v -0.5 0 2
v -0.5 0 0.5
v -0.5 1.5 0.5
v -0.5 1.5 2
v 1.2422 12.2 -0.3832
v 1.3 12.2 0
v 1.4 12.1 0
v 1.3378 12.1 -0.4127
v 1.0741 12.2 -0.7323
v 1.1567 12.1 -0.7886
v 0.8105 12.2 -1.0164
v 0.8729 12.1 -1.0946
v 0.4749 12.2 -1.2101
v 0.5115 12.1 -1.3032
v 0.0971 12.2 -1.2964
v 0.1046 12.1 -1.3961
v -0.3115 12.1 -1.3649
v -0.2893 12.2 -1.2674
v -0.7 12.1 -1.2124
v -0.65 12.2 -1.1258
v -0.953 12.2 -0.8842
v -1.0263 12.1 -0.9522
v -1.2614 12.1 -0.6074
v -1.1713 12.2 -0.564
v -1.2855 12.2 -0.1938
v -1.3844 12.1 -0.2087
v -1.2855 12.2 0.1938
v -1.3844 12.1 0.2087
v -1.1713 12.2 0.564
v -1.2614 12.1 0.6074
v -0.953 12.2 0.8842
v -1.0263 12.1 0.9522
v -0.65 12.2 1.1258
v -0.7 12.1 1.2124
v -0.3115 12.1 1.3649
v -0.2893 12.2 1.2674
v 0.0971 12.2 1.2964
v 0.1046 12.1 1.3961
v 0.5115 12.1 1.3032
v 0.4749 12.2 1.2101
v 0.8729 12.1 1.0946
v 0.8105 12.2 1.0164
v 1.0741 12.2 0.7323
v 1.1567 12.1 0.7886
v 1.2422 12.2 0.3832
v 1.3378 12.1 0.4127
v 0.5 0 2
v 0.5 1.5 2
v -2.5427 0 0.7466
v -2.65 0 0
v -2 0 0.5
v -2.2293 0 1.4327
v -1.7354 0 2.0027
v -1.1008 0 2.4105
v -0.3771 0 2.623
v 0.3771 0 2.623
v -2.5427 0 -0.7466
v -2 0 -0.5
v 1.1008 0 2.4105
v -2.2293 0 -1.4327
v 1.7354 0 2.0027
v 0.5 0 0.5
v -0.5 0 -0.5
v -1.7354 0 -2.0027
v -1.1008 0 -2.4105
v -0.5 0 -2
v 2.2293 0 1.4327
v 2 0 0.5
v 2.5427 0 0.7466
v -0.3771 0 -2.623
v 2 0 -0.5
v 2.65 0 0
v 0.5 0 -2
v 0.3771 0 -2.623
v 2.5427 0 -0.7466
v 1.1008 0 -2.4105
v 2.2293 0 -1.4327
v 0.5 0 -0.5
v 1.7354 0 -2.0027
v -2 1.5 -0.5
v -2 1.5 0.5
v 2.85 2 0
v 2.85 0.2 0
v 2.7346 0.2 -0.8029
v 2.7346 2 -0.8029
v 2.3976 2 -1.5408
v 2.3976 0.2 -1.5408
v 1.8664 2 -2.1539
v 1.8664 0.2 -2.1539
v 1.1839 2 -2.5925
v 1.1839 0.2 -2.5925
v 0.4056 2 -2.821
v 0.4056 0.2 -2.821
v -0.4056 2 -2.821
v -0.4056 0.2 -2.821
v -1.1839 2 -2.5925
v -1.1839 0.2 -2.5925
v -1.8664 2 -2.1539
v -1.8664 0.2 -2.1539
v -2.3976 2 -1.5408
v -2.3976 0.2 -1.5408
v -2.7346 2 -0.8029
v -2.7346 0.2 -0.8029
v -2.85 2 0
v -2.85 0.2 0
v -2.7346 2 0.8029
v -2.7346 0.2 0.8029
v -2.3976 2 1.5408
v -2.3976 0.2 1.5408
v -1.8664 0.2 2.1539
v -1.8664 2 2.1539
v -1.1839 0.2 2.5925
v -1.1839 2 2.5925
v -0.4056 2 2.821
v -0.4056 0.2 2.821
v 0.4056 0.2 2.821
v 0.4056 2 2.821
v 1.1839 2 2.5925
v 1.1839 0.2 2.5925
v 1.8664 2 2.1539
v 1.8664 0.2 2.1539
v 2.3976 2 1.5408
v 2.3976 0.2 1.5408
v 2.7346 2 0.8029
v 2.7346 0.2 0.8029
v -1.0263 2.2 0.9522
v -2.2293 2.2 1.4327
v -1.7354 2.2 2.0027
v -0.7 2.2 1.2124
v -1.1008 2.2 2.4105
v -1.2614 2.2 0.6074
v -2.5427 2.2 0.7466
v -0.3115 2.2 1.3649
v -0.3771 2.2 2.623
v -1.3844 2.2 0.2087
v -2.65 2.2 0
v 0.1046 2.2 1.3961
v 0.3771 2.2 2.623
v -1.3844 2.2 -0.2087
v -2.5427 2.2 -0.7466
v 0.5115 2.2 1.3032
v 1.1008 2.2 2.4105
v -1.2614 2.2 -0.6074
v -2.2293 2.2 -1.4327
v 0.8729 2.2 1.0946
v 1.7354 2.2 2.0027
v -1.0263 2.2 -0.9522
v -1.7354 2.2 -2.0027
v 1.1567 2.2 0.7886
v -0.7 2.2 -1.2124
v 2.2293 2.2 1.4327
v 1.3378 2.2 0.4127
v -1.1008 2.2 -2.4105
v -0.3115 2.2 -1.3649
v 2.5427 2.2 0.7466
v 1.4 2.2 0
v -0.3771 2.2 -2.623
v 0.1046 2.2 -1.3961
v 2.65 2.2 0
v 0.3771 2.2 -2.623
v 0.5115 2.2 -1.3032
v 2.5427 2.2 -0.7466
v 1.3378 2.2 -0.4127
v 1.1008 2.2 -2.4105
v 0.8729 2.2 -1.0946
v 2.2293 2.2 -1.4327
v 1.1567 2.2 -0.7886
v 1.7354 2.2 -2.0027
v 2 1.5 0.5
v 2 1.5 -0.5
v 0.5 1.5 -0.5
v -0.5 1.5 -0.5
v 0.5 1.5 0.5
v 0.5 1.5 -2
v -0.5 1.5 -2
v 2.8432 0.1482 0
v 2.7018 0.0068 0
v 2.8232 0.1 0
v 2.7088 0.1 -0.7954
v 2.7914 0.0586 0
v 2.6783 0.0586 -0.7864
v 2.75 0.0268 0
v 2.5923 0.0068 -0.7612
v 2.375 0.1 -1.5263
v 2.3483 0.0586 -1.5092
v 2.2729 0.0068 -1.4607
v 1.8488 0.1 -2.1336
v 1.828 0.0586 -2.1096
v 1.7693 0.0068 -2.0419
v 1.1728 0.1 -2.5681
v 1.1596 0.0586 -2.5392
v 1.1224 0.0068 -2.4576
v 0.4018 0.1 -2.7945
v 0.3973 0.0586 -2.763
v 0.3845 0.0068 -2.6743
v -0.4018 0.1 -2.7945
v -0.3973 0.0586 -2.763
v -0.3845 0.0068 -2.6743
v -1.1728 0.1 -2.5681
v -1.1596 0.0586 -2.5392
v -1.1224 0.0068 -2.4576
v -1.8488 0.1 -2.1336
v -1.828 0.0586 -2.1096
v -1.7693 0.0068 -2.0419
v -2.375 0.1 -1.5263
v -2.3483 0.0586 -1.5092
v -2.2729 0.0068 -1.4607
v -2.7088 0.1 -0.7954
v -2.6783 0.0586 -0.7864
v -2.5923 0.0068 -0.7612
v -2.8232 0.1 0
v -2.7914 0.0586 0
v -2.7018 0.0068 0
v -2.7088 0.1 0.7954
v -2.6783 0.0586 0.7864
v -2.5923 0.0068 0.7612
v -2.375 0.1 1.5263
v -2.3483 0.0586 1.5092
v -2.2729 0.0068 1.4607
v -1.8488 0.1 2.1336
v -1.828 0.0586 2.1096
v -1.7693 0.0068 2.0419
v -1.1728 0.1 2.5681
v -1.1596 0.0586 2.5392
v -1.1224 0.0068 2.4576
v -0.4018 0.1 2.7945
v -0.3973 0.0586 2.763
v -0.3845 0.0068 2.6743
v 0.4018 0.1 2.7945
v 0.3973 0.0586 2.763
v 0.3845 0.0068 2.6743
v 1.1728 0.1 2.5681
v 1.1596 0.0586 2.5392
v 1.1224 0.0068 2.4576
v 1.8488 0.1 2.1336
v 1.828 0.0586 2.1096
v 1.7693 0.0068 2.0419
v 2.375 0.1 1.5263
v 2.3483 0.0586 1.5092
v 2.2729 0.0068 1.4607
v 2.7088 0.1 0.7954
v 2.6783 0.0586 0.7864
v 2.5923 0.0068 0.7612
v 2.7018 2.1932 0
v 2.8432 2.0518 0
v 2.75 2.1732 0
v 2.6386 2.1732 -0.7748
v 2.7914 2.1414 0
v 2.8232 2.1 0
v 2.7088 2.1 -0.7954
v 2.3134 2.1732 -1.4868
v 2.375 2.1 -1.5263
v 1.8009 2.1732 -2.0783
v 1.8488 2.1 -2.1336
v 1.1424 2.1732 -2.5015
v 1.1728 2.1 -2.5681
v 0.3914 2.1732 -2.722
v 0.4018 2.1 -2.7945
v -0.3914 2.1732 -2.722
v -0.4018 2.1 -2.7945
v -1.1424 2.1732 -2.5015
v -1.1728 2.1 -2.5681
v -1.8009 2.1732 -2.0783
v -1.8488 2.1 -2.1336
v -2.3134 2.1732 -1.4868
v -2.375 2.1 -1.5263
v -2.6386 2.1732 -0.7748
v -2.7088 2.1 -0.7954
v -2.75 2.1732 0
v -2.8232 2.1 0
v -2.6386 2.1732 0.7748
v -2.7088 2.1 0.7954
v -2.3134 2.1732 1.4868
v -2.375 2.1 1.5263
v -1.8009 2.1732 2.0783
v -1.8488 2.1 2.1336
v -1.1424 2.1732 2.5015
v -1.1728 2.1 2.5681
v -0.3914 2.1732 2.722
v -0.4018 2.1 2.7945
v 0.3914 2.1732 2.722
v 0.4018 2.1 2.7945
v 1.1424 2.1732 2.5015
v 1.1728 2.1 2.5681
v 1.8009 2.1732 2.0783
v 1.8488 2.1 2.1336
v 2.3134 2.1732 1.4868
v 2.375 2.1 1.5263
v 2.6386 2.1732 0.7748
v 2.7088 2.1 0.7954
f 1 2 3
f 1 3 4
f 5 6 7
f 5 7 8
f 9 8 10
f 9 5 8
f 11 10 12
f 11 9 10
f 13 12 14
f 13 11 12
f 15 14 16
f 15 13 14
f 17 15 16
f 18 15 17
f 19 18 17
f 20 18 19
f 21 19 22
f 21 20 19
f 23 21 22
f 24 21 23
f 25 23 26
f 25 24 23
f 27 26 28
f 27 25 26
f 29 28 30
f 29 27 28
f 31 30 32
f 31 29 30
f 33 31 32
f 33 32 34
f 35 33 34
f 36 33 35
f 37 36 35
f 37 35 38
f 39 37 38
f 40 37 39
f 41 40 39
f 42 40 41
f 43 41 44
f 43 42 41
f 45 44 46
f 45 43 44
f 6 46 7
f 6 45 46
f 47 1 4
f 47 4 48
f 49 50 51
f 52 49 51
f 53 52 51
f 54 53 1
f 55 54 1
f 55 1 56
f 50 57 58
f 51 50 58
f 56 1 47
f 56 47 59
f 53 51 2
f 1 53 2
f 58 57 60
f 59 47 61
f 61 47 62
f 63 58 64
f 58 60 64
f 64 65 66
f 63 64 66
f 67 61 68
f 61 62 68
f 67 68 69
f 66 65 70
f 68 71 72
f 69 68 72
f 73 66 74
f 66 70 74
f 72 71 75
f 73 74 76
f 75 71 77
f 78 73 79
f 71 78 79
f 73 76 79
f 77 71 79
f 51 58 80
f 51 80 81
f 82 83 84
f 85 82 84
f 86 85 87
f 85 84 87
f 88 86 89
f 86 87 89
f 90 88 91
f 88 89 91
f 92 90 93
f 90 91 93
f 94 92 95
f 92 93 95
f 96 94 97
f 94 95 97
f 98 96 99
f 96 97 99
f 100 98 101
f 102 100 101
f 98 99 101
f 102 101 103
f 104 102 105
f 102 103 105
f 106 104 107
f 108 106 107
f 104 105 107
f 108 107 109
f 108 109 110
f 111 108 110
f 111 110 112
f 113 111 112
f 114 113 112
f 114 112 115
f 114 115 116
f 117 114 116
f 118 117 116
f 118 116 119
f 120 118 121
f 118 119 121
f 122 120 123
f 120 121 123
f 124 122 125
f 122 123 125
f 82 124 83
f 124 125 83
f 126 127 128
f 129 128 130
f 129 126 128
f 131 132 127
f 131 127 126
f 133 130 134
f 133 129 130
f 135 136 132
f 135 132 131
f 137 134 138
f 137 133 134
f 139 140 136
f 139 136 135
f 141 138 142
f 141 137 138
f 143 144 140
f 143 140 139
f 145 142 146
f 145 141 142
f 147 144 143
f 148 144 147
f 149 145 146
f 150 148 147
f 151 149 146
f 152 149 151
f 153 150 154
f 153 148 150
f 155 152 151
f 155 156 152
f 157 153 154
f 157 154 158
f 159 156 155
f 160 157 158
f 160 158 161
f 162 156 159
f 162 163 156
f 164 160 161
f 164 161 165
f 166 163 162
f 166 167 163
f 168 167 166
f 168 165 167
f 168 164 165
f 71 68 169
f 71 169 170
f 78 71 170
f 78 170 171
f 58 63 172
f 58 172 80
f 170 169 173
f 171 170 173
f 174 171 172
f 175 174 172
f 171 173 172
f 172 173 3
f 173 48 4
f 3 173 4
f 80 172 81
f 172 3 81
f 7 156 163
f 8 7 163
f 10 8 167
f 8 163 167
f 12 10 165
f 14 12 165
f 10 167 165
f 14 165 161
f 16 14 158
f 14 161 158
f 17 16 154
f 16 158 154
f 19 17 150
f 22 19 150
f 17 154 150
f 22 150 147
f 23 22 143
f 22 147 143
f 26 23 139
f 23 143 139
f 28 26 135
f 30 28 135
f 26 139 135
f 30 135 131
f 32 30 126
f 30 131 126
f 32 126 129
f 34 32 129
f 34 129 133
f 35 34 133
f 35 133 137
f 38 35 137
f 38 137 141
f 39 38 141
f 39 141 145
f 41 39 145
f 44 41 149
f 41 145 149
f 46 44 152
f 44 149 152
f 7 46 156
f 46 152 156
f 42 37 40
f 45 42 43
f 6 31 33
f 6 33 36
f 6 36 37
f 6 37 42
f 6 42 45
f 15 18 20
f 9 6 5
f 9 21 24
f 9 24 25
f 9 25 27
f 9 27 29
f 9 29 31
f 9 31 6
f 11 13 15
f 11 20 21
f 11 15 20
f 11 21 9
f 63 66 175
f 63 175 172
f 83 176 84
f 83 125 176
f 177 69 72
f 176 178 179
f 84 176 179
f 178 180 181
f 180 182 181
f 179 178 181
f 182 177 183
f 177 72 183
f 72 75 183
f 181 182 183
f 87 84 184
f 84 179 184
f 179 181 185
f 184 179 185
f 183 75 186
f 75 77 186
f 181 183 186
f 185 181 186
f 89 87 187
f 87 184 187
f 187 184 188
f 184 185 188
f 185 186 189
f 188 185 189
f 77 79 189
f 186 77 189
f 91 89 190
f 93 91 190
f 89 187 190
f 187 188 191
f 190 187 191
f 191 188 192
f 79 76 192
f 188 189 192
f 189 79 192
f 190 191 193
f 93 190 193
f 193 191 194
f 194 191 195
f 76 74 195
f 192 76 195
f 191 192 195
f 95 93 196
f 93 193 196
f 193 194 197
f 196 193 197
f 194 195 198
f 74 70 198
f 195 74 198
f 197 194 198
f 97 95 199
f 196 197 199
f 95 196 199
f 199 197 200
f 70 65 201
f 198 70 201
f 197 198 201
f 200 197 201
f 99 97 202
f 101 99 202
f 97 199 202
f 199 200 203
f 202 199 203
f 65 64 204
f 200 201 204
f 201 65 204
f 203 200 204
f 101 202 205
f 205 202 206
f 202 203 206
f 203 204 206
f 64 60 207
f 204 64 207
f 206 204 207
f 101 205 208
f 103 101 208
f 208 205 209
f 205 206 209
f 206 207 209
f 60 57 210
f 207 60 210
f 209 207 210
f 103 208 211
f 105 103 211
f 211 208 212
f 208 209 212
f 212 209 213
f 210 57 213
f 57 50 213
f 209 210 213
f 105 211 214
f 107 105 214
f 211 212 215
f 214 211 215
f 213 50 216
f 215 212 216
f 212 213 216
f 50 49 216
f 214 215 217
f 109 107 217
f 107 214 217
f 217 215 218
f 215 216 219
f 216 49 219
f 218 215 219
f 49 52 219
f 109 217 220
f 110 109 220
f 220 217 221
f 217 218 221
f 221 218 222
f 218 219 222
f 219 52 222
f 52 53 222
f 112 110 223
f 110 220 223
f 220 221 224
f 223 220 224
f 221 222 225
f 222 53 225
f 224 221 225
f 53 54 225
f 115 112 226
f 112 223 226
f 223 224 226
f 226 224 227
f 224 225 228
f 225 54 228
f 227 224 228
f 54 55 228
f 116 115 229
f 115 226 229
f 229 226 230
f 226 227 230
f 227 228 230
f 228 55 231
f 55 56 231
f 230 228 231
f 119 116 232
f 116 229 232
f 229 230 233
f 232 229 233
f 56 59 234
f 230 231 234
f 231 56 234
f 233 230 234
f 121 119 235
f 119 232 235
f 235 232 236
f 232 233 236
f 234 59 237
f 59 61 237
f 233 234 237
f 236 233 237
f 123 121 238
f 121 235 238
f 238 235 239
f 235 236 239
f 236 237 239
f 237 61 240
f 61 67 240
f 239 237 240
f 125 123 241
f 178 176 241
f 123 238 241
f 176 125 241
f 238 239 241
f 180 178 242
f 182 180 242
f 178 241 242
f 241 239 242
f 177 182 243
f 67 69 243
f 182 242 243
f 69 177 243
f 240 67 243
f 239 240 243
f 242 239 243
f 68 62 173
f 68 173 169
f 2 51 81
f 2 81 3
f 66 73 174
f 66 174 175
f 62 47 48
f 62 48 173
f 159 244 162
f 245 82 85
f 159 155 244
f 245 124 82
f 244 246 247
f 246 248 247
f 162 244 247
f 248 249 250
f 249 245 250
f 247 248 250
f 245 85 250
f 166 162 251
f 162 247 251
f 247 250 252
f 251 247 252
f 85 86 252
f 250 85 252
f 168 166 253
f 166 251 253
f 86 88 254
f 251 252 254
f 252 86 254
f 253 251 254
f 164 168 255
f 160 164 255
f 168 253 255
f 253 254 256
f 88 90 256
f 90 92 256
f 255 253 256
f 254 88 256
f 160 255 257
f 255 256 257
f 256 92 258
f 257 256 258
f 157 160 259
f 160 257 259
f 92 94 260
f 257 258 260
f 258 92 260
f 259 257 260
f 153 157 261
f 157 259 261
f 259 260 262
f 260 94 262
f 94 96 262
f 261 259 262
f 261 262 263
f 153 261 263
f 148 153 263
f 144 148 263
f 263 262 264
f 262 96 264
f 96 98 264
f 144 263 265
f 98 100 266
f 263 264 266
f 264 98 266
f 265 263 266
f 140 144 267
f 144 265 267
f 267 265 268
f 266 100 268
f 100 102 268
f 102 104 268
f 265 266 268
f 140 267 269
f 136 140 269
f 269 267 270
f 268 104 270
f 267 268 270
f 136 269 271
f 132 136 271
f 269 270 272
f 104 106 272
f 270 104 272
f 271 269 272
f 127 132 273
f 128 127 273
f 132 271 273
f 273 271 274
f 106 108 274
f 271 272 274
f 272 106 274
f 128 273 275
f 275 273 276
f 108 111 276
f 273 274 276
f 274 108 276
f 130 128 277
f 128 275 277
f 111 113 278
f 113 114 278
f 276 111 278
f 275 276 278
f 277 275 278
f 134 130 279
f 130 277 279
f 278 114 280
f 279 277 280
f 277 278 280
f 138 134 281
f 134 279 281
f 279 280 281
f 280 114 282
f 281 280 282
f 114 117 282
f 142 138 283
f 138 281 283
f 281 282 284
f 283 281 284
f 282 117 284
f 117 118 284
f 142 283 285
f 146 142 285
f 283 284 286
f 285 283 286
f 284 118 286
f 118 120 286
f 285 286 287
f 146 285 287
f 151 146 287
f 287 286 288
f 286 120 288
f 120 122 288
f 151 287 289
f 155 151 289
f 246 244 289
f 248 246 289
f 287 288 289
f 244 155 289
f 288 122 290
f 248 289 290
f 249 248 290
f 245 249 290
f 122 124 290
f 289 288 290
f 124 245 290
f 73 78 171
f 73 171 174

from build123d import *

# Parameters (mm, degrees)
SKETCH_1_R          = 2.85
EXTRUDE_1_DEPTH     = 2.2
SKETCH_2_R          = 1.4
EXTRUDE_2_DEPTH     = 10
CHAMFER_1_SIZE      = 0.1
FILLET_1_R          = 0.2
CUT_EXTRUDE_1_DEPTH = 1.5


with BuildPart() as part:
    # Эскиз1 → Бобышка-Вытянуть1 (new body)
    with BuildSketch(Plane(origin=(0, 0, 0), x_dir=(1, 0, 0), z_dir=(0, 1, 0))):
        Circle(SKETCH_1_R)
    extrude(amount=EXTRUDE_1_DEPTH)

    # Эскиз2 → Бобышка-Вытянуть2 (add)
    with BuildSketch(Plane(origin=(0, 2.2, 0), x_dir=(1, 0, 0), z_dir=(0, 1, 0))):
        Circle(SKETCH_2_R)
    extrude(amount=EXTRUDE_2_DEPTH)

    # Фаска1
    chamfer_1_edges = [part.edges().sort_by_distance(p)[0] for p in [
        (-1.4, 12.2, 0),
    ]]
    chamfer(chamfer_1_edges, length=CHAMFER_1_SIZE)

    # Скругление1
    fillet_1_edges = [part.edges().sort_by_distance(p)[0] for p in [
        (-2.85, 0, 0),
        (-2.85, 2.2, 0),
    ]]
    fillet(fillet_1_edges, radius=FILLET_1_R)

    # Эскиз3 → Вырез-Вытянуть1 (cut)
    with BuildSketch(Plane.XZ):
        Polygon((-0.5, 0.5), (-0.5, 2), (0.5, 2), (0.5, 0.5), (2, 0.5), (2, -0.5), (0.5, -0.5), (0.5, -2), (-0.5, -2), (-0.5, -0.5), (-2, -0.5), (-2, 0.5), align=None)
    extrude(amount=-CUT_EXTRUDE_1_DEPTH, mode=Mode.SUBTRACT)


solid = part.part
